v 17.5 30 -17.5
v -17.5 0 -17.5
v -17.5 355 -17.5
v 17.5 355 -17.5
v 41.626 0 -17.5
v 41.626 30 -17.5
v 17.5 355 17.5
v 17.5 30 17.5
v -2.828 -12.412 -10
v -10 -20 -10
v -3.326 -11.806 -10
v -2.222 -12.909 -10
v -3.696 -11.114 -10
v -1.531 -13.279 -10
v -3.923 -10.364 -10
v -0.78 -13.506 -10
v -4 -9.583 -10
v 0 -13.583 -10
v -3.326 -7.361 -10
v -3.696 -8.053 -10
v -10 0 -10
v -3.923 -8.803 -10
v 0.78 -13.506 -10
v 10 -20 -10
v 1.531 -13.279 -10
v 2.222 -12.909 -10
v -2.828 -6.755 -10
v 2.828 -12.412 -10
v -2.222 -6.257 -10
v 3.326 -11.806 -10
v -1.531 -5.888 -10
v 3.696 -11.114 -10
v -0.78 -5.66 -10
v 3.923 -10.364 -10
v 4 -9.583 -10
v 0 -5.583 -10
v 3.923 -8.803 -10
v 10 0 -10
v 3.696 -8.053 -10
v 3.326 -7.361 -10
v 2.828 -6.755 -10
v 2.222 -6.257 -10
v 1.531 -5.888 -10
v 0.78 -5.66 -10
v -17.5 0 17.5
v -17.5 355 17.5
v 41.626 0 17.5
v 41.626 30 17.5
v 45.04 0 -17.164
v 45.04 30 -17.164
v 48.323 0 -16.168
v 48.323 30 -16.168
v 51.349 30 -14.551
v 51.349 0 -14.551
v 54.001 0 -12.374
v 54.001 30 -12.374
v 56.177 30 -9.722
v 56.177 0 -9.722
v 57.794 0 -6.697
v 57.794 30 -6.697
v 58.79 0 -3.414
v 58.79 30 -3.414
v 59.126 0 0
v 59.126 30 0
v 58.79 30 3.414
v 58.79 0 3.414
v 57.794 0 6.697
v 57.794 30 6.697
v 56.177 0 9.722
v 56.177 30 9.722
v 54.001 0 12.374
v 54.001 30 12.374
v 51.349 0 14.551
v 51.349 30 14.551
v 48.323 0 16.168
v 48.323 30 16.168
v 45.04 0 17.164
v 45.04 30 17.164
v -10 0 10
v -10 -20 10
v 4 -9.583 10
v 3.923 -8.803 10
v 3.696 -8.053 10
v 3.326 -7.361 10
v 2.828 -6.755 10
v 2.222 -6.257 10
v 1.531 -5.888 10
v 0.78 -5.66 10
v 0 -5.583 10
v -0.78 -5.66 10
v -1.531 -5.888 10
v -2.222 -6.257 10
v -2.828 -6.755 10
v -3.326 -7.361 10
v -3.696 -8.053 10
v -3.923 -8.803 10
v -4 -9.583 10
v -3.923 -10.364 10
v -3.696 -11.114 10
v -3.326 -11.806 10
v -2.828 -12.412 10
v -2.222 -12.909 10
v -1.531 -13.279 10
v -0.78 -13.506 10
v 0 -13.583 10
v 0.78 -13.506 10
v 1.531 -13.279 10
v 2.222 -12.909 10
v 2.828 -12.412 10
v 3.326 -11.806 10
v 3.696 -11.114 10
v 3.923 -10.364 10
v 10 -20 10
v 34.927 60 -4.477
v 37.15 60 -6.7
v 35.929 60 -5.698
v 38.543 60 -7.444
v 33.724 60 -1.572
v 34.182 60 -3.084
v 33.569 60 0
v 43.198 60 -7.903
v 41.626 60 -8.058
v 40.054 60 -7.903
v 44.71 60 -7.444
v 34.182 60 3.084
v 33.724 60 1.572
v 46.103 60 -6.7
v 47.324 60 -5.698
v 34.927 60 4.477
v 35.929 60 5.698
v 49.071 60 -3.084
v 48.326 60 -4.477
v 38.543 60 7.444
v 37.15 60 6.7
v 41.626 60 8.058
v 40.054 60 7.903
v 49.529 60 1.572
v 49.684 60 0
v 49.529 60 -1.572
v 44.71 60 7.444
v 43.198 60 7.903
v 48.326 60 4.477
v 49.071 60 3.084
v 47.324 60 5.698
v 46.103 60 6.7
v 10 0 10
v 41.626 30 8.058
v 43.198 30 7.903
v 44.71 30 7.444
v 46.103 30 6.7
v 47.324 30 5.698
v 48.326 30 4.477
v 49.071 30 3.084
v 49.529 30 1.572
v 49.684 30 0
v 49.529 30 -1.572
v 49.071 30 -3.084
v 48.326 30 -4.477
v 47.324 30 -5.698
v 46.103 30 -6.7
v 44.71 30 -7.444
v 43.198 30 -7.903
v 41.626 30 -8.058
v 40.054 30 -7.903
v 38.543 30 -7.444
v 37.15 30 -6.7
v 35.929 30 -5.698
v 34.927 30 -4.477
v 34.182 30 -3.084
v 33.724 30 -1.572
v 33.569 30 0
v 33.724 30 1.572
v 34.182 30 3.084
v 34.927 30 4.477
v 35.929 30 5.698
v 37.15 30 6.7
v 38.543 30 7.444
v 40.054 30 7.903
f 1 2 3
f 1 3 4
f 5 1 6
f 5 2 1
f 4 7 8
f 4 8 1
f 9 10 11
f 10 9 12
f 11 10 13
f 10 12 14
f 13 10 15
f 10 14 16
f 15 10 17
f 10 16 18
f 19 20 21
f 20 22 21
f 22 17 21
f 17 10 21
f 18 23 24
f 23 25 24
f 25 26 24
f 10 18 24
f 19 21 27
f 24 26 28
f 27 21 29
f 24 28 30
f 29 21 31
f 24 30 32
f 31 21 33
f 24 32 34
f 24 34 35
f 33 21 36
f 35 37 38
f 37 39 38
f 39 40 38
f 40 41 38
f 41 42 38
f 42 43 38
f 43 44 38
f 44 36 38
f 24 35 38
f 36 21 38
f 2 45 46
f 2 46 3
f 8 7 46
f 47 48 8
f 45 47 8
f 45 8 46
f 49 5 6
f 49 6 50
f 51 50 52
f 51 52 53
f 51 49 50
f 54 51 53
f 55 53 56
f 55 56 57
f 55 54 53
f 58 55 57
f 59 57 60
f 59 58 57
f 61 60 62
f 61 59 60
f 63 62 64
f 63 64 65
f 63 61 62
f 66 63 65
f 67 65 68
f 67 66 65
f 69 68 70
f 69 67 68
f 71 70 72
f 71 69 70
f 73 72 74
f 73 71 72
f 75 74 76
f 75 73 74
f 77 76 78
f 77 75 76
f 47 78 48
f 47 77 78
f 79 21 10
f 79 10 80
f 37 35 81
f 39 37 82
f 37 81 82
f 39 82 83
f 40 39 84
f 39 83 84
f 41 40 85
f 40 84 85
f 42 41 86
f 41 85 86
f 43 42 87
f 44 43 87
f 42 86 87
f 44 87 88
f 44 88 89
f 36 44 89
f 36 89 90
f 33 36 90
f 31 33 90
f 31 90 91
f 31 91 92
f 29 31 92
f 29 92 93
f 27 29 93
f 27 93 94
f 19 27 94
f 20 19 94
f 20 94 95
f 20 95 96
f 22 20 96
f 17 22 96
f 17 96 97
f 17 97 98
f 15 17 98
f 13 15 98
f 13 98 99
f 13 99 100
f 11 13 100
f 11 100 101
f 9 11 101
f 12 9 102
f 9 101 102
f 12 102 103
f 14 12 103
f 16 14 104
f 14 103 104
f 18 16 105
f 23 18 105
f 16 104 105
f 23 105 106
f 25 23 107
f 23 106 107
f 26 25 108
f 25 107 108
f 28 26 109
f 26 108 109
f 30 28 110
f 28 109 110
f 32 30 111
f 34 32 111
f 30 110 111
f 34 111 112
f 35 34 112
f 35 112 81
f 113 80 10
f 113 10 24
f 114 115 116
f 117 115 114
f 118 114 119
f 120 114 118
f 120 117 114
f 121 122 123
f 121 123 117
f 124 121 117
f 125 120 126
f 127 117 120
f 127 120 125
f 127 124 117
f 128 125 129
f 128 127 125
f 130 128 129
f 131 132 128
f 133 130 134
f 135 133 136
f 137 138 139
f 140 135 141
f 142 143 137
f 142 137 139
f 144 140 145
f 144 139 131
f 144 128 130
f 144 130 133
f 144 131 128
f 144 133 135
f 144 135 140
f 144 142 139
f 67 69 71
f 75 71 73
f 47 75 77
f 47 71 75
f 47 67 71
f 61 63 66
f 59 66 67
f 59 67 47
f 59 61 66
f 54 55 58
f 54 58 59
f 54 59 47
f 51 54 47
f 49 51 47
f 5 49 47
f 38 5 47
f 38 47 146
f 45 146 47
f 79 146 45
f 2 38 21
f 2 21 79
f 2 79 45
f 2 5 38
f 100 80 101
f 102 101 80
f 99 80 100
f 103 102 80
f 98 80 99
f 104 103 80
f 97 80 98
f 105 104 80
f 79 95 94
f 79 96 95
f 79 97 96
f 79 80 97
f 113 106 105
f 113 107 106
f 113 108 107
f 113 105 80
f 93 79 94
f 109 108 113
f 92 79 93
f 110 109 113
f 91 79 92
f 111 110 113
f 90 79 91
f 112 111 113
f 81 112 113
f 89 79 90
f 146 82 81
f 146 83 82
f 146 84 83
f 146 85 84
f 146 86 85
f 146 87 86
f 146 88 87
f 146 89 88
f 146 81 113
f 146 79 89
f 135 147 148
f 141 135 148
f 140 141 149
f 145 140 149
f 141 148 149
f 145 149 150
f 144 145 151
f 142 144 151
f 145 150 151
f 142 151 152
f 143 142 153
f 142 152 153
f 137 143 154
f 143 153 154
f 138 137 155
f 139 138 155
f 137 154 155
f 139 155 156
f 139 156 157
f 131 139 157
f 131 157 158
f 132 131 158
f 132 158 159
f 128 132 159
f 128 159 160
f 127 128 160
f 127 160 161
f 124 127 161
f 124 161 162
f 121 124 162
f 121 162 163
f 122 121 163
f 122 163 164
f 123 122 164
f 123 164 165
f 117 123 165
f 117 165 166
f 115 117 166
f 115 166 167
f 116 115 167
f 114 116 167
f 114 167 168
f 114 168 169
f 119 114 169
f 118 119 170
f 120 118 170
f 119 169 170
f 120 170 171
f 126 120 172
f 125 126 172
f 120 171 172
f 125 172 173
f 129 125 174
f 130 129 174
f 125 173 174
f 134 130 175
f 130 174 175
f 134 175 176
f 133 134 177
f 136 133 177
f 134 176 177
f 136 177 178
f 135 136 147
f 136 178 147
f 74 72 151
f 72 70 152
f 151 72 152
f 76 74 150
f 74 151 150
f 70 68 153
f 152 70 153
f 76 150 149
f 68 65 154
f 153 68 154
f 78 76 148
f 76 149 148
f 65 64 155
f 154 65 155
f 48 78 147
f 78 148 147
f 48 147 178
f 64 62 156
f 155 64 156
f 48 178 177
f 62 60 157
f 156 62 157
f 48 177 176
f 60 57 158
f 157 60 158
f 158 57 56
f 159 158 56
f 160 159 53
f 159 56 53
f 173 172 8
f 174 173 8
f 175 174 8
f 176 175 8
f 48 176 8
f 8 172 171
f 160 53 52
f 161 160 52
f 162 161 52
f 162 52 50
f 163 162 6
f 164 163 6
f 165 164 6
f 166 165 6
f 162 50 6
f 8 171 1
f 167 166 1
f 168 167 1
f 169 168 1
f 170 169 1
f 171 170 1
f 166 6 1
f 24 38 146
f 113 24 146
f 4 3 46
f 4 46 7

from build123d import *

# Parameters (mm, degrees)
SKETCH1_W           = 35
SKETCH1_H           = 35
BOSS_EXTRUDE1_DEPTH = 355
SKETCH1_3_R         = 8.057610329
BOSS_EXTRUDE2_DEPTH = 30
SKETCH1_4_R         = 8.057610329
BOSS_EXTRUDE3_DEPTH = 60
SKETCH2_W           = 20
SKETCH2_H           = 20
BOSS_EXTRUDE4_DEPTH = 20
CUT_EXTRUDE1_REACH  = 362.939
SKETCH3_R           = 4


with BuildPart() as part:
    # Sketch1 → Boss-Extrude1 (new body)
    with BuildSketch(Plane(origin=(0, 0, 0), x_dir=(1, 0, 0), z_dir=(0, 1, 0))):
        Rectangle(SKETCH1_W, SKETCH1_H)
    extrude(amount=BOSS_EXTRUDE1_DEPTH)

    # Sketch1<3> → Boss-Extrude2 (add)
    with BuildSketch(Plane(origin=(0, 0, 0), x_dir=(1, 0, 0), z_dir=(0, 1, 0))):
        with BuildLine():
            Line((41.626297716, 17.5), (17.5, 17.5))
            Line((17.5, 17.5), (17.5, -17.5))
            Line((17.5, -17.5), (41.626297716, -17.5))
            ThreePointArc((41.626297716, -17.5), (59.126297716, 0), (41.626297716, 17.5))
        make_face()
        with Locations((41.626297716, 0)):
            Circle(SKETCH1_3_R, mode=Mode.SUBTRACT)
    extrude(amount=BOSS_EXTRUDE2_DEPTH)

    # Sketch1<4> → Boss-Extrude3 (add)
    with BuildSketch(Plane(origin=(0, 0, 0), x_dir=(1, 0, 0), z_dir=(0, 1, 0))):
        with Locations((41.626297716, 0)):
            Circle(SKETCH1_4_R)
    extrude(amount=BOSS_EXTRUDE3_DEPTH)

    # Sketch2 → Boss-Extrude4 (add)
    with BuildSketch(Plane.XZ):
        Rectangle(SKETCH2_W, SKETCH2_H)
    extrude(amount=BOSS_EXTRUDE4_DEPTH)

    # Sketch3 → Cut-Extrude1 (cut, up to next)
    with BuildSketch(Plane.XY.offset(10), mode=Mode.PRIVATE) as cut_extrude1_sk1:
        with Locations((0, -9.583237288)):
            Circle(SKETCH3_R)
    cut_extrude1_tool1 = extrude(cut_extrude1_sk1.sketch, amount=-CUT_EXTRUDE1_REACH, mode=Mode.PRIVATE) & part.part
    add(cut_extrude1_tool1.solids().sort_by_distance((0, -9.583237, 10))[0], mode=Mode.SUBTRACT)


solid = part.part
